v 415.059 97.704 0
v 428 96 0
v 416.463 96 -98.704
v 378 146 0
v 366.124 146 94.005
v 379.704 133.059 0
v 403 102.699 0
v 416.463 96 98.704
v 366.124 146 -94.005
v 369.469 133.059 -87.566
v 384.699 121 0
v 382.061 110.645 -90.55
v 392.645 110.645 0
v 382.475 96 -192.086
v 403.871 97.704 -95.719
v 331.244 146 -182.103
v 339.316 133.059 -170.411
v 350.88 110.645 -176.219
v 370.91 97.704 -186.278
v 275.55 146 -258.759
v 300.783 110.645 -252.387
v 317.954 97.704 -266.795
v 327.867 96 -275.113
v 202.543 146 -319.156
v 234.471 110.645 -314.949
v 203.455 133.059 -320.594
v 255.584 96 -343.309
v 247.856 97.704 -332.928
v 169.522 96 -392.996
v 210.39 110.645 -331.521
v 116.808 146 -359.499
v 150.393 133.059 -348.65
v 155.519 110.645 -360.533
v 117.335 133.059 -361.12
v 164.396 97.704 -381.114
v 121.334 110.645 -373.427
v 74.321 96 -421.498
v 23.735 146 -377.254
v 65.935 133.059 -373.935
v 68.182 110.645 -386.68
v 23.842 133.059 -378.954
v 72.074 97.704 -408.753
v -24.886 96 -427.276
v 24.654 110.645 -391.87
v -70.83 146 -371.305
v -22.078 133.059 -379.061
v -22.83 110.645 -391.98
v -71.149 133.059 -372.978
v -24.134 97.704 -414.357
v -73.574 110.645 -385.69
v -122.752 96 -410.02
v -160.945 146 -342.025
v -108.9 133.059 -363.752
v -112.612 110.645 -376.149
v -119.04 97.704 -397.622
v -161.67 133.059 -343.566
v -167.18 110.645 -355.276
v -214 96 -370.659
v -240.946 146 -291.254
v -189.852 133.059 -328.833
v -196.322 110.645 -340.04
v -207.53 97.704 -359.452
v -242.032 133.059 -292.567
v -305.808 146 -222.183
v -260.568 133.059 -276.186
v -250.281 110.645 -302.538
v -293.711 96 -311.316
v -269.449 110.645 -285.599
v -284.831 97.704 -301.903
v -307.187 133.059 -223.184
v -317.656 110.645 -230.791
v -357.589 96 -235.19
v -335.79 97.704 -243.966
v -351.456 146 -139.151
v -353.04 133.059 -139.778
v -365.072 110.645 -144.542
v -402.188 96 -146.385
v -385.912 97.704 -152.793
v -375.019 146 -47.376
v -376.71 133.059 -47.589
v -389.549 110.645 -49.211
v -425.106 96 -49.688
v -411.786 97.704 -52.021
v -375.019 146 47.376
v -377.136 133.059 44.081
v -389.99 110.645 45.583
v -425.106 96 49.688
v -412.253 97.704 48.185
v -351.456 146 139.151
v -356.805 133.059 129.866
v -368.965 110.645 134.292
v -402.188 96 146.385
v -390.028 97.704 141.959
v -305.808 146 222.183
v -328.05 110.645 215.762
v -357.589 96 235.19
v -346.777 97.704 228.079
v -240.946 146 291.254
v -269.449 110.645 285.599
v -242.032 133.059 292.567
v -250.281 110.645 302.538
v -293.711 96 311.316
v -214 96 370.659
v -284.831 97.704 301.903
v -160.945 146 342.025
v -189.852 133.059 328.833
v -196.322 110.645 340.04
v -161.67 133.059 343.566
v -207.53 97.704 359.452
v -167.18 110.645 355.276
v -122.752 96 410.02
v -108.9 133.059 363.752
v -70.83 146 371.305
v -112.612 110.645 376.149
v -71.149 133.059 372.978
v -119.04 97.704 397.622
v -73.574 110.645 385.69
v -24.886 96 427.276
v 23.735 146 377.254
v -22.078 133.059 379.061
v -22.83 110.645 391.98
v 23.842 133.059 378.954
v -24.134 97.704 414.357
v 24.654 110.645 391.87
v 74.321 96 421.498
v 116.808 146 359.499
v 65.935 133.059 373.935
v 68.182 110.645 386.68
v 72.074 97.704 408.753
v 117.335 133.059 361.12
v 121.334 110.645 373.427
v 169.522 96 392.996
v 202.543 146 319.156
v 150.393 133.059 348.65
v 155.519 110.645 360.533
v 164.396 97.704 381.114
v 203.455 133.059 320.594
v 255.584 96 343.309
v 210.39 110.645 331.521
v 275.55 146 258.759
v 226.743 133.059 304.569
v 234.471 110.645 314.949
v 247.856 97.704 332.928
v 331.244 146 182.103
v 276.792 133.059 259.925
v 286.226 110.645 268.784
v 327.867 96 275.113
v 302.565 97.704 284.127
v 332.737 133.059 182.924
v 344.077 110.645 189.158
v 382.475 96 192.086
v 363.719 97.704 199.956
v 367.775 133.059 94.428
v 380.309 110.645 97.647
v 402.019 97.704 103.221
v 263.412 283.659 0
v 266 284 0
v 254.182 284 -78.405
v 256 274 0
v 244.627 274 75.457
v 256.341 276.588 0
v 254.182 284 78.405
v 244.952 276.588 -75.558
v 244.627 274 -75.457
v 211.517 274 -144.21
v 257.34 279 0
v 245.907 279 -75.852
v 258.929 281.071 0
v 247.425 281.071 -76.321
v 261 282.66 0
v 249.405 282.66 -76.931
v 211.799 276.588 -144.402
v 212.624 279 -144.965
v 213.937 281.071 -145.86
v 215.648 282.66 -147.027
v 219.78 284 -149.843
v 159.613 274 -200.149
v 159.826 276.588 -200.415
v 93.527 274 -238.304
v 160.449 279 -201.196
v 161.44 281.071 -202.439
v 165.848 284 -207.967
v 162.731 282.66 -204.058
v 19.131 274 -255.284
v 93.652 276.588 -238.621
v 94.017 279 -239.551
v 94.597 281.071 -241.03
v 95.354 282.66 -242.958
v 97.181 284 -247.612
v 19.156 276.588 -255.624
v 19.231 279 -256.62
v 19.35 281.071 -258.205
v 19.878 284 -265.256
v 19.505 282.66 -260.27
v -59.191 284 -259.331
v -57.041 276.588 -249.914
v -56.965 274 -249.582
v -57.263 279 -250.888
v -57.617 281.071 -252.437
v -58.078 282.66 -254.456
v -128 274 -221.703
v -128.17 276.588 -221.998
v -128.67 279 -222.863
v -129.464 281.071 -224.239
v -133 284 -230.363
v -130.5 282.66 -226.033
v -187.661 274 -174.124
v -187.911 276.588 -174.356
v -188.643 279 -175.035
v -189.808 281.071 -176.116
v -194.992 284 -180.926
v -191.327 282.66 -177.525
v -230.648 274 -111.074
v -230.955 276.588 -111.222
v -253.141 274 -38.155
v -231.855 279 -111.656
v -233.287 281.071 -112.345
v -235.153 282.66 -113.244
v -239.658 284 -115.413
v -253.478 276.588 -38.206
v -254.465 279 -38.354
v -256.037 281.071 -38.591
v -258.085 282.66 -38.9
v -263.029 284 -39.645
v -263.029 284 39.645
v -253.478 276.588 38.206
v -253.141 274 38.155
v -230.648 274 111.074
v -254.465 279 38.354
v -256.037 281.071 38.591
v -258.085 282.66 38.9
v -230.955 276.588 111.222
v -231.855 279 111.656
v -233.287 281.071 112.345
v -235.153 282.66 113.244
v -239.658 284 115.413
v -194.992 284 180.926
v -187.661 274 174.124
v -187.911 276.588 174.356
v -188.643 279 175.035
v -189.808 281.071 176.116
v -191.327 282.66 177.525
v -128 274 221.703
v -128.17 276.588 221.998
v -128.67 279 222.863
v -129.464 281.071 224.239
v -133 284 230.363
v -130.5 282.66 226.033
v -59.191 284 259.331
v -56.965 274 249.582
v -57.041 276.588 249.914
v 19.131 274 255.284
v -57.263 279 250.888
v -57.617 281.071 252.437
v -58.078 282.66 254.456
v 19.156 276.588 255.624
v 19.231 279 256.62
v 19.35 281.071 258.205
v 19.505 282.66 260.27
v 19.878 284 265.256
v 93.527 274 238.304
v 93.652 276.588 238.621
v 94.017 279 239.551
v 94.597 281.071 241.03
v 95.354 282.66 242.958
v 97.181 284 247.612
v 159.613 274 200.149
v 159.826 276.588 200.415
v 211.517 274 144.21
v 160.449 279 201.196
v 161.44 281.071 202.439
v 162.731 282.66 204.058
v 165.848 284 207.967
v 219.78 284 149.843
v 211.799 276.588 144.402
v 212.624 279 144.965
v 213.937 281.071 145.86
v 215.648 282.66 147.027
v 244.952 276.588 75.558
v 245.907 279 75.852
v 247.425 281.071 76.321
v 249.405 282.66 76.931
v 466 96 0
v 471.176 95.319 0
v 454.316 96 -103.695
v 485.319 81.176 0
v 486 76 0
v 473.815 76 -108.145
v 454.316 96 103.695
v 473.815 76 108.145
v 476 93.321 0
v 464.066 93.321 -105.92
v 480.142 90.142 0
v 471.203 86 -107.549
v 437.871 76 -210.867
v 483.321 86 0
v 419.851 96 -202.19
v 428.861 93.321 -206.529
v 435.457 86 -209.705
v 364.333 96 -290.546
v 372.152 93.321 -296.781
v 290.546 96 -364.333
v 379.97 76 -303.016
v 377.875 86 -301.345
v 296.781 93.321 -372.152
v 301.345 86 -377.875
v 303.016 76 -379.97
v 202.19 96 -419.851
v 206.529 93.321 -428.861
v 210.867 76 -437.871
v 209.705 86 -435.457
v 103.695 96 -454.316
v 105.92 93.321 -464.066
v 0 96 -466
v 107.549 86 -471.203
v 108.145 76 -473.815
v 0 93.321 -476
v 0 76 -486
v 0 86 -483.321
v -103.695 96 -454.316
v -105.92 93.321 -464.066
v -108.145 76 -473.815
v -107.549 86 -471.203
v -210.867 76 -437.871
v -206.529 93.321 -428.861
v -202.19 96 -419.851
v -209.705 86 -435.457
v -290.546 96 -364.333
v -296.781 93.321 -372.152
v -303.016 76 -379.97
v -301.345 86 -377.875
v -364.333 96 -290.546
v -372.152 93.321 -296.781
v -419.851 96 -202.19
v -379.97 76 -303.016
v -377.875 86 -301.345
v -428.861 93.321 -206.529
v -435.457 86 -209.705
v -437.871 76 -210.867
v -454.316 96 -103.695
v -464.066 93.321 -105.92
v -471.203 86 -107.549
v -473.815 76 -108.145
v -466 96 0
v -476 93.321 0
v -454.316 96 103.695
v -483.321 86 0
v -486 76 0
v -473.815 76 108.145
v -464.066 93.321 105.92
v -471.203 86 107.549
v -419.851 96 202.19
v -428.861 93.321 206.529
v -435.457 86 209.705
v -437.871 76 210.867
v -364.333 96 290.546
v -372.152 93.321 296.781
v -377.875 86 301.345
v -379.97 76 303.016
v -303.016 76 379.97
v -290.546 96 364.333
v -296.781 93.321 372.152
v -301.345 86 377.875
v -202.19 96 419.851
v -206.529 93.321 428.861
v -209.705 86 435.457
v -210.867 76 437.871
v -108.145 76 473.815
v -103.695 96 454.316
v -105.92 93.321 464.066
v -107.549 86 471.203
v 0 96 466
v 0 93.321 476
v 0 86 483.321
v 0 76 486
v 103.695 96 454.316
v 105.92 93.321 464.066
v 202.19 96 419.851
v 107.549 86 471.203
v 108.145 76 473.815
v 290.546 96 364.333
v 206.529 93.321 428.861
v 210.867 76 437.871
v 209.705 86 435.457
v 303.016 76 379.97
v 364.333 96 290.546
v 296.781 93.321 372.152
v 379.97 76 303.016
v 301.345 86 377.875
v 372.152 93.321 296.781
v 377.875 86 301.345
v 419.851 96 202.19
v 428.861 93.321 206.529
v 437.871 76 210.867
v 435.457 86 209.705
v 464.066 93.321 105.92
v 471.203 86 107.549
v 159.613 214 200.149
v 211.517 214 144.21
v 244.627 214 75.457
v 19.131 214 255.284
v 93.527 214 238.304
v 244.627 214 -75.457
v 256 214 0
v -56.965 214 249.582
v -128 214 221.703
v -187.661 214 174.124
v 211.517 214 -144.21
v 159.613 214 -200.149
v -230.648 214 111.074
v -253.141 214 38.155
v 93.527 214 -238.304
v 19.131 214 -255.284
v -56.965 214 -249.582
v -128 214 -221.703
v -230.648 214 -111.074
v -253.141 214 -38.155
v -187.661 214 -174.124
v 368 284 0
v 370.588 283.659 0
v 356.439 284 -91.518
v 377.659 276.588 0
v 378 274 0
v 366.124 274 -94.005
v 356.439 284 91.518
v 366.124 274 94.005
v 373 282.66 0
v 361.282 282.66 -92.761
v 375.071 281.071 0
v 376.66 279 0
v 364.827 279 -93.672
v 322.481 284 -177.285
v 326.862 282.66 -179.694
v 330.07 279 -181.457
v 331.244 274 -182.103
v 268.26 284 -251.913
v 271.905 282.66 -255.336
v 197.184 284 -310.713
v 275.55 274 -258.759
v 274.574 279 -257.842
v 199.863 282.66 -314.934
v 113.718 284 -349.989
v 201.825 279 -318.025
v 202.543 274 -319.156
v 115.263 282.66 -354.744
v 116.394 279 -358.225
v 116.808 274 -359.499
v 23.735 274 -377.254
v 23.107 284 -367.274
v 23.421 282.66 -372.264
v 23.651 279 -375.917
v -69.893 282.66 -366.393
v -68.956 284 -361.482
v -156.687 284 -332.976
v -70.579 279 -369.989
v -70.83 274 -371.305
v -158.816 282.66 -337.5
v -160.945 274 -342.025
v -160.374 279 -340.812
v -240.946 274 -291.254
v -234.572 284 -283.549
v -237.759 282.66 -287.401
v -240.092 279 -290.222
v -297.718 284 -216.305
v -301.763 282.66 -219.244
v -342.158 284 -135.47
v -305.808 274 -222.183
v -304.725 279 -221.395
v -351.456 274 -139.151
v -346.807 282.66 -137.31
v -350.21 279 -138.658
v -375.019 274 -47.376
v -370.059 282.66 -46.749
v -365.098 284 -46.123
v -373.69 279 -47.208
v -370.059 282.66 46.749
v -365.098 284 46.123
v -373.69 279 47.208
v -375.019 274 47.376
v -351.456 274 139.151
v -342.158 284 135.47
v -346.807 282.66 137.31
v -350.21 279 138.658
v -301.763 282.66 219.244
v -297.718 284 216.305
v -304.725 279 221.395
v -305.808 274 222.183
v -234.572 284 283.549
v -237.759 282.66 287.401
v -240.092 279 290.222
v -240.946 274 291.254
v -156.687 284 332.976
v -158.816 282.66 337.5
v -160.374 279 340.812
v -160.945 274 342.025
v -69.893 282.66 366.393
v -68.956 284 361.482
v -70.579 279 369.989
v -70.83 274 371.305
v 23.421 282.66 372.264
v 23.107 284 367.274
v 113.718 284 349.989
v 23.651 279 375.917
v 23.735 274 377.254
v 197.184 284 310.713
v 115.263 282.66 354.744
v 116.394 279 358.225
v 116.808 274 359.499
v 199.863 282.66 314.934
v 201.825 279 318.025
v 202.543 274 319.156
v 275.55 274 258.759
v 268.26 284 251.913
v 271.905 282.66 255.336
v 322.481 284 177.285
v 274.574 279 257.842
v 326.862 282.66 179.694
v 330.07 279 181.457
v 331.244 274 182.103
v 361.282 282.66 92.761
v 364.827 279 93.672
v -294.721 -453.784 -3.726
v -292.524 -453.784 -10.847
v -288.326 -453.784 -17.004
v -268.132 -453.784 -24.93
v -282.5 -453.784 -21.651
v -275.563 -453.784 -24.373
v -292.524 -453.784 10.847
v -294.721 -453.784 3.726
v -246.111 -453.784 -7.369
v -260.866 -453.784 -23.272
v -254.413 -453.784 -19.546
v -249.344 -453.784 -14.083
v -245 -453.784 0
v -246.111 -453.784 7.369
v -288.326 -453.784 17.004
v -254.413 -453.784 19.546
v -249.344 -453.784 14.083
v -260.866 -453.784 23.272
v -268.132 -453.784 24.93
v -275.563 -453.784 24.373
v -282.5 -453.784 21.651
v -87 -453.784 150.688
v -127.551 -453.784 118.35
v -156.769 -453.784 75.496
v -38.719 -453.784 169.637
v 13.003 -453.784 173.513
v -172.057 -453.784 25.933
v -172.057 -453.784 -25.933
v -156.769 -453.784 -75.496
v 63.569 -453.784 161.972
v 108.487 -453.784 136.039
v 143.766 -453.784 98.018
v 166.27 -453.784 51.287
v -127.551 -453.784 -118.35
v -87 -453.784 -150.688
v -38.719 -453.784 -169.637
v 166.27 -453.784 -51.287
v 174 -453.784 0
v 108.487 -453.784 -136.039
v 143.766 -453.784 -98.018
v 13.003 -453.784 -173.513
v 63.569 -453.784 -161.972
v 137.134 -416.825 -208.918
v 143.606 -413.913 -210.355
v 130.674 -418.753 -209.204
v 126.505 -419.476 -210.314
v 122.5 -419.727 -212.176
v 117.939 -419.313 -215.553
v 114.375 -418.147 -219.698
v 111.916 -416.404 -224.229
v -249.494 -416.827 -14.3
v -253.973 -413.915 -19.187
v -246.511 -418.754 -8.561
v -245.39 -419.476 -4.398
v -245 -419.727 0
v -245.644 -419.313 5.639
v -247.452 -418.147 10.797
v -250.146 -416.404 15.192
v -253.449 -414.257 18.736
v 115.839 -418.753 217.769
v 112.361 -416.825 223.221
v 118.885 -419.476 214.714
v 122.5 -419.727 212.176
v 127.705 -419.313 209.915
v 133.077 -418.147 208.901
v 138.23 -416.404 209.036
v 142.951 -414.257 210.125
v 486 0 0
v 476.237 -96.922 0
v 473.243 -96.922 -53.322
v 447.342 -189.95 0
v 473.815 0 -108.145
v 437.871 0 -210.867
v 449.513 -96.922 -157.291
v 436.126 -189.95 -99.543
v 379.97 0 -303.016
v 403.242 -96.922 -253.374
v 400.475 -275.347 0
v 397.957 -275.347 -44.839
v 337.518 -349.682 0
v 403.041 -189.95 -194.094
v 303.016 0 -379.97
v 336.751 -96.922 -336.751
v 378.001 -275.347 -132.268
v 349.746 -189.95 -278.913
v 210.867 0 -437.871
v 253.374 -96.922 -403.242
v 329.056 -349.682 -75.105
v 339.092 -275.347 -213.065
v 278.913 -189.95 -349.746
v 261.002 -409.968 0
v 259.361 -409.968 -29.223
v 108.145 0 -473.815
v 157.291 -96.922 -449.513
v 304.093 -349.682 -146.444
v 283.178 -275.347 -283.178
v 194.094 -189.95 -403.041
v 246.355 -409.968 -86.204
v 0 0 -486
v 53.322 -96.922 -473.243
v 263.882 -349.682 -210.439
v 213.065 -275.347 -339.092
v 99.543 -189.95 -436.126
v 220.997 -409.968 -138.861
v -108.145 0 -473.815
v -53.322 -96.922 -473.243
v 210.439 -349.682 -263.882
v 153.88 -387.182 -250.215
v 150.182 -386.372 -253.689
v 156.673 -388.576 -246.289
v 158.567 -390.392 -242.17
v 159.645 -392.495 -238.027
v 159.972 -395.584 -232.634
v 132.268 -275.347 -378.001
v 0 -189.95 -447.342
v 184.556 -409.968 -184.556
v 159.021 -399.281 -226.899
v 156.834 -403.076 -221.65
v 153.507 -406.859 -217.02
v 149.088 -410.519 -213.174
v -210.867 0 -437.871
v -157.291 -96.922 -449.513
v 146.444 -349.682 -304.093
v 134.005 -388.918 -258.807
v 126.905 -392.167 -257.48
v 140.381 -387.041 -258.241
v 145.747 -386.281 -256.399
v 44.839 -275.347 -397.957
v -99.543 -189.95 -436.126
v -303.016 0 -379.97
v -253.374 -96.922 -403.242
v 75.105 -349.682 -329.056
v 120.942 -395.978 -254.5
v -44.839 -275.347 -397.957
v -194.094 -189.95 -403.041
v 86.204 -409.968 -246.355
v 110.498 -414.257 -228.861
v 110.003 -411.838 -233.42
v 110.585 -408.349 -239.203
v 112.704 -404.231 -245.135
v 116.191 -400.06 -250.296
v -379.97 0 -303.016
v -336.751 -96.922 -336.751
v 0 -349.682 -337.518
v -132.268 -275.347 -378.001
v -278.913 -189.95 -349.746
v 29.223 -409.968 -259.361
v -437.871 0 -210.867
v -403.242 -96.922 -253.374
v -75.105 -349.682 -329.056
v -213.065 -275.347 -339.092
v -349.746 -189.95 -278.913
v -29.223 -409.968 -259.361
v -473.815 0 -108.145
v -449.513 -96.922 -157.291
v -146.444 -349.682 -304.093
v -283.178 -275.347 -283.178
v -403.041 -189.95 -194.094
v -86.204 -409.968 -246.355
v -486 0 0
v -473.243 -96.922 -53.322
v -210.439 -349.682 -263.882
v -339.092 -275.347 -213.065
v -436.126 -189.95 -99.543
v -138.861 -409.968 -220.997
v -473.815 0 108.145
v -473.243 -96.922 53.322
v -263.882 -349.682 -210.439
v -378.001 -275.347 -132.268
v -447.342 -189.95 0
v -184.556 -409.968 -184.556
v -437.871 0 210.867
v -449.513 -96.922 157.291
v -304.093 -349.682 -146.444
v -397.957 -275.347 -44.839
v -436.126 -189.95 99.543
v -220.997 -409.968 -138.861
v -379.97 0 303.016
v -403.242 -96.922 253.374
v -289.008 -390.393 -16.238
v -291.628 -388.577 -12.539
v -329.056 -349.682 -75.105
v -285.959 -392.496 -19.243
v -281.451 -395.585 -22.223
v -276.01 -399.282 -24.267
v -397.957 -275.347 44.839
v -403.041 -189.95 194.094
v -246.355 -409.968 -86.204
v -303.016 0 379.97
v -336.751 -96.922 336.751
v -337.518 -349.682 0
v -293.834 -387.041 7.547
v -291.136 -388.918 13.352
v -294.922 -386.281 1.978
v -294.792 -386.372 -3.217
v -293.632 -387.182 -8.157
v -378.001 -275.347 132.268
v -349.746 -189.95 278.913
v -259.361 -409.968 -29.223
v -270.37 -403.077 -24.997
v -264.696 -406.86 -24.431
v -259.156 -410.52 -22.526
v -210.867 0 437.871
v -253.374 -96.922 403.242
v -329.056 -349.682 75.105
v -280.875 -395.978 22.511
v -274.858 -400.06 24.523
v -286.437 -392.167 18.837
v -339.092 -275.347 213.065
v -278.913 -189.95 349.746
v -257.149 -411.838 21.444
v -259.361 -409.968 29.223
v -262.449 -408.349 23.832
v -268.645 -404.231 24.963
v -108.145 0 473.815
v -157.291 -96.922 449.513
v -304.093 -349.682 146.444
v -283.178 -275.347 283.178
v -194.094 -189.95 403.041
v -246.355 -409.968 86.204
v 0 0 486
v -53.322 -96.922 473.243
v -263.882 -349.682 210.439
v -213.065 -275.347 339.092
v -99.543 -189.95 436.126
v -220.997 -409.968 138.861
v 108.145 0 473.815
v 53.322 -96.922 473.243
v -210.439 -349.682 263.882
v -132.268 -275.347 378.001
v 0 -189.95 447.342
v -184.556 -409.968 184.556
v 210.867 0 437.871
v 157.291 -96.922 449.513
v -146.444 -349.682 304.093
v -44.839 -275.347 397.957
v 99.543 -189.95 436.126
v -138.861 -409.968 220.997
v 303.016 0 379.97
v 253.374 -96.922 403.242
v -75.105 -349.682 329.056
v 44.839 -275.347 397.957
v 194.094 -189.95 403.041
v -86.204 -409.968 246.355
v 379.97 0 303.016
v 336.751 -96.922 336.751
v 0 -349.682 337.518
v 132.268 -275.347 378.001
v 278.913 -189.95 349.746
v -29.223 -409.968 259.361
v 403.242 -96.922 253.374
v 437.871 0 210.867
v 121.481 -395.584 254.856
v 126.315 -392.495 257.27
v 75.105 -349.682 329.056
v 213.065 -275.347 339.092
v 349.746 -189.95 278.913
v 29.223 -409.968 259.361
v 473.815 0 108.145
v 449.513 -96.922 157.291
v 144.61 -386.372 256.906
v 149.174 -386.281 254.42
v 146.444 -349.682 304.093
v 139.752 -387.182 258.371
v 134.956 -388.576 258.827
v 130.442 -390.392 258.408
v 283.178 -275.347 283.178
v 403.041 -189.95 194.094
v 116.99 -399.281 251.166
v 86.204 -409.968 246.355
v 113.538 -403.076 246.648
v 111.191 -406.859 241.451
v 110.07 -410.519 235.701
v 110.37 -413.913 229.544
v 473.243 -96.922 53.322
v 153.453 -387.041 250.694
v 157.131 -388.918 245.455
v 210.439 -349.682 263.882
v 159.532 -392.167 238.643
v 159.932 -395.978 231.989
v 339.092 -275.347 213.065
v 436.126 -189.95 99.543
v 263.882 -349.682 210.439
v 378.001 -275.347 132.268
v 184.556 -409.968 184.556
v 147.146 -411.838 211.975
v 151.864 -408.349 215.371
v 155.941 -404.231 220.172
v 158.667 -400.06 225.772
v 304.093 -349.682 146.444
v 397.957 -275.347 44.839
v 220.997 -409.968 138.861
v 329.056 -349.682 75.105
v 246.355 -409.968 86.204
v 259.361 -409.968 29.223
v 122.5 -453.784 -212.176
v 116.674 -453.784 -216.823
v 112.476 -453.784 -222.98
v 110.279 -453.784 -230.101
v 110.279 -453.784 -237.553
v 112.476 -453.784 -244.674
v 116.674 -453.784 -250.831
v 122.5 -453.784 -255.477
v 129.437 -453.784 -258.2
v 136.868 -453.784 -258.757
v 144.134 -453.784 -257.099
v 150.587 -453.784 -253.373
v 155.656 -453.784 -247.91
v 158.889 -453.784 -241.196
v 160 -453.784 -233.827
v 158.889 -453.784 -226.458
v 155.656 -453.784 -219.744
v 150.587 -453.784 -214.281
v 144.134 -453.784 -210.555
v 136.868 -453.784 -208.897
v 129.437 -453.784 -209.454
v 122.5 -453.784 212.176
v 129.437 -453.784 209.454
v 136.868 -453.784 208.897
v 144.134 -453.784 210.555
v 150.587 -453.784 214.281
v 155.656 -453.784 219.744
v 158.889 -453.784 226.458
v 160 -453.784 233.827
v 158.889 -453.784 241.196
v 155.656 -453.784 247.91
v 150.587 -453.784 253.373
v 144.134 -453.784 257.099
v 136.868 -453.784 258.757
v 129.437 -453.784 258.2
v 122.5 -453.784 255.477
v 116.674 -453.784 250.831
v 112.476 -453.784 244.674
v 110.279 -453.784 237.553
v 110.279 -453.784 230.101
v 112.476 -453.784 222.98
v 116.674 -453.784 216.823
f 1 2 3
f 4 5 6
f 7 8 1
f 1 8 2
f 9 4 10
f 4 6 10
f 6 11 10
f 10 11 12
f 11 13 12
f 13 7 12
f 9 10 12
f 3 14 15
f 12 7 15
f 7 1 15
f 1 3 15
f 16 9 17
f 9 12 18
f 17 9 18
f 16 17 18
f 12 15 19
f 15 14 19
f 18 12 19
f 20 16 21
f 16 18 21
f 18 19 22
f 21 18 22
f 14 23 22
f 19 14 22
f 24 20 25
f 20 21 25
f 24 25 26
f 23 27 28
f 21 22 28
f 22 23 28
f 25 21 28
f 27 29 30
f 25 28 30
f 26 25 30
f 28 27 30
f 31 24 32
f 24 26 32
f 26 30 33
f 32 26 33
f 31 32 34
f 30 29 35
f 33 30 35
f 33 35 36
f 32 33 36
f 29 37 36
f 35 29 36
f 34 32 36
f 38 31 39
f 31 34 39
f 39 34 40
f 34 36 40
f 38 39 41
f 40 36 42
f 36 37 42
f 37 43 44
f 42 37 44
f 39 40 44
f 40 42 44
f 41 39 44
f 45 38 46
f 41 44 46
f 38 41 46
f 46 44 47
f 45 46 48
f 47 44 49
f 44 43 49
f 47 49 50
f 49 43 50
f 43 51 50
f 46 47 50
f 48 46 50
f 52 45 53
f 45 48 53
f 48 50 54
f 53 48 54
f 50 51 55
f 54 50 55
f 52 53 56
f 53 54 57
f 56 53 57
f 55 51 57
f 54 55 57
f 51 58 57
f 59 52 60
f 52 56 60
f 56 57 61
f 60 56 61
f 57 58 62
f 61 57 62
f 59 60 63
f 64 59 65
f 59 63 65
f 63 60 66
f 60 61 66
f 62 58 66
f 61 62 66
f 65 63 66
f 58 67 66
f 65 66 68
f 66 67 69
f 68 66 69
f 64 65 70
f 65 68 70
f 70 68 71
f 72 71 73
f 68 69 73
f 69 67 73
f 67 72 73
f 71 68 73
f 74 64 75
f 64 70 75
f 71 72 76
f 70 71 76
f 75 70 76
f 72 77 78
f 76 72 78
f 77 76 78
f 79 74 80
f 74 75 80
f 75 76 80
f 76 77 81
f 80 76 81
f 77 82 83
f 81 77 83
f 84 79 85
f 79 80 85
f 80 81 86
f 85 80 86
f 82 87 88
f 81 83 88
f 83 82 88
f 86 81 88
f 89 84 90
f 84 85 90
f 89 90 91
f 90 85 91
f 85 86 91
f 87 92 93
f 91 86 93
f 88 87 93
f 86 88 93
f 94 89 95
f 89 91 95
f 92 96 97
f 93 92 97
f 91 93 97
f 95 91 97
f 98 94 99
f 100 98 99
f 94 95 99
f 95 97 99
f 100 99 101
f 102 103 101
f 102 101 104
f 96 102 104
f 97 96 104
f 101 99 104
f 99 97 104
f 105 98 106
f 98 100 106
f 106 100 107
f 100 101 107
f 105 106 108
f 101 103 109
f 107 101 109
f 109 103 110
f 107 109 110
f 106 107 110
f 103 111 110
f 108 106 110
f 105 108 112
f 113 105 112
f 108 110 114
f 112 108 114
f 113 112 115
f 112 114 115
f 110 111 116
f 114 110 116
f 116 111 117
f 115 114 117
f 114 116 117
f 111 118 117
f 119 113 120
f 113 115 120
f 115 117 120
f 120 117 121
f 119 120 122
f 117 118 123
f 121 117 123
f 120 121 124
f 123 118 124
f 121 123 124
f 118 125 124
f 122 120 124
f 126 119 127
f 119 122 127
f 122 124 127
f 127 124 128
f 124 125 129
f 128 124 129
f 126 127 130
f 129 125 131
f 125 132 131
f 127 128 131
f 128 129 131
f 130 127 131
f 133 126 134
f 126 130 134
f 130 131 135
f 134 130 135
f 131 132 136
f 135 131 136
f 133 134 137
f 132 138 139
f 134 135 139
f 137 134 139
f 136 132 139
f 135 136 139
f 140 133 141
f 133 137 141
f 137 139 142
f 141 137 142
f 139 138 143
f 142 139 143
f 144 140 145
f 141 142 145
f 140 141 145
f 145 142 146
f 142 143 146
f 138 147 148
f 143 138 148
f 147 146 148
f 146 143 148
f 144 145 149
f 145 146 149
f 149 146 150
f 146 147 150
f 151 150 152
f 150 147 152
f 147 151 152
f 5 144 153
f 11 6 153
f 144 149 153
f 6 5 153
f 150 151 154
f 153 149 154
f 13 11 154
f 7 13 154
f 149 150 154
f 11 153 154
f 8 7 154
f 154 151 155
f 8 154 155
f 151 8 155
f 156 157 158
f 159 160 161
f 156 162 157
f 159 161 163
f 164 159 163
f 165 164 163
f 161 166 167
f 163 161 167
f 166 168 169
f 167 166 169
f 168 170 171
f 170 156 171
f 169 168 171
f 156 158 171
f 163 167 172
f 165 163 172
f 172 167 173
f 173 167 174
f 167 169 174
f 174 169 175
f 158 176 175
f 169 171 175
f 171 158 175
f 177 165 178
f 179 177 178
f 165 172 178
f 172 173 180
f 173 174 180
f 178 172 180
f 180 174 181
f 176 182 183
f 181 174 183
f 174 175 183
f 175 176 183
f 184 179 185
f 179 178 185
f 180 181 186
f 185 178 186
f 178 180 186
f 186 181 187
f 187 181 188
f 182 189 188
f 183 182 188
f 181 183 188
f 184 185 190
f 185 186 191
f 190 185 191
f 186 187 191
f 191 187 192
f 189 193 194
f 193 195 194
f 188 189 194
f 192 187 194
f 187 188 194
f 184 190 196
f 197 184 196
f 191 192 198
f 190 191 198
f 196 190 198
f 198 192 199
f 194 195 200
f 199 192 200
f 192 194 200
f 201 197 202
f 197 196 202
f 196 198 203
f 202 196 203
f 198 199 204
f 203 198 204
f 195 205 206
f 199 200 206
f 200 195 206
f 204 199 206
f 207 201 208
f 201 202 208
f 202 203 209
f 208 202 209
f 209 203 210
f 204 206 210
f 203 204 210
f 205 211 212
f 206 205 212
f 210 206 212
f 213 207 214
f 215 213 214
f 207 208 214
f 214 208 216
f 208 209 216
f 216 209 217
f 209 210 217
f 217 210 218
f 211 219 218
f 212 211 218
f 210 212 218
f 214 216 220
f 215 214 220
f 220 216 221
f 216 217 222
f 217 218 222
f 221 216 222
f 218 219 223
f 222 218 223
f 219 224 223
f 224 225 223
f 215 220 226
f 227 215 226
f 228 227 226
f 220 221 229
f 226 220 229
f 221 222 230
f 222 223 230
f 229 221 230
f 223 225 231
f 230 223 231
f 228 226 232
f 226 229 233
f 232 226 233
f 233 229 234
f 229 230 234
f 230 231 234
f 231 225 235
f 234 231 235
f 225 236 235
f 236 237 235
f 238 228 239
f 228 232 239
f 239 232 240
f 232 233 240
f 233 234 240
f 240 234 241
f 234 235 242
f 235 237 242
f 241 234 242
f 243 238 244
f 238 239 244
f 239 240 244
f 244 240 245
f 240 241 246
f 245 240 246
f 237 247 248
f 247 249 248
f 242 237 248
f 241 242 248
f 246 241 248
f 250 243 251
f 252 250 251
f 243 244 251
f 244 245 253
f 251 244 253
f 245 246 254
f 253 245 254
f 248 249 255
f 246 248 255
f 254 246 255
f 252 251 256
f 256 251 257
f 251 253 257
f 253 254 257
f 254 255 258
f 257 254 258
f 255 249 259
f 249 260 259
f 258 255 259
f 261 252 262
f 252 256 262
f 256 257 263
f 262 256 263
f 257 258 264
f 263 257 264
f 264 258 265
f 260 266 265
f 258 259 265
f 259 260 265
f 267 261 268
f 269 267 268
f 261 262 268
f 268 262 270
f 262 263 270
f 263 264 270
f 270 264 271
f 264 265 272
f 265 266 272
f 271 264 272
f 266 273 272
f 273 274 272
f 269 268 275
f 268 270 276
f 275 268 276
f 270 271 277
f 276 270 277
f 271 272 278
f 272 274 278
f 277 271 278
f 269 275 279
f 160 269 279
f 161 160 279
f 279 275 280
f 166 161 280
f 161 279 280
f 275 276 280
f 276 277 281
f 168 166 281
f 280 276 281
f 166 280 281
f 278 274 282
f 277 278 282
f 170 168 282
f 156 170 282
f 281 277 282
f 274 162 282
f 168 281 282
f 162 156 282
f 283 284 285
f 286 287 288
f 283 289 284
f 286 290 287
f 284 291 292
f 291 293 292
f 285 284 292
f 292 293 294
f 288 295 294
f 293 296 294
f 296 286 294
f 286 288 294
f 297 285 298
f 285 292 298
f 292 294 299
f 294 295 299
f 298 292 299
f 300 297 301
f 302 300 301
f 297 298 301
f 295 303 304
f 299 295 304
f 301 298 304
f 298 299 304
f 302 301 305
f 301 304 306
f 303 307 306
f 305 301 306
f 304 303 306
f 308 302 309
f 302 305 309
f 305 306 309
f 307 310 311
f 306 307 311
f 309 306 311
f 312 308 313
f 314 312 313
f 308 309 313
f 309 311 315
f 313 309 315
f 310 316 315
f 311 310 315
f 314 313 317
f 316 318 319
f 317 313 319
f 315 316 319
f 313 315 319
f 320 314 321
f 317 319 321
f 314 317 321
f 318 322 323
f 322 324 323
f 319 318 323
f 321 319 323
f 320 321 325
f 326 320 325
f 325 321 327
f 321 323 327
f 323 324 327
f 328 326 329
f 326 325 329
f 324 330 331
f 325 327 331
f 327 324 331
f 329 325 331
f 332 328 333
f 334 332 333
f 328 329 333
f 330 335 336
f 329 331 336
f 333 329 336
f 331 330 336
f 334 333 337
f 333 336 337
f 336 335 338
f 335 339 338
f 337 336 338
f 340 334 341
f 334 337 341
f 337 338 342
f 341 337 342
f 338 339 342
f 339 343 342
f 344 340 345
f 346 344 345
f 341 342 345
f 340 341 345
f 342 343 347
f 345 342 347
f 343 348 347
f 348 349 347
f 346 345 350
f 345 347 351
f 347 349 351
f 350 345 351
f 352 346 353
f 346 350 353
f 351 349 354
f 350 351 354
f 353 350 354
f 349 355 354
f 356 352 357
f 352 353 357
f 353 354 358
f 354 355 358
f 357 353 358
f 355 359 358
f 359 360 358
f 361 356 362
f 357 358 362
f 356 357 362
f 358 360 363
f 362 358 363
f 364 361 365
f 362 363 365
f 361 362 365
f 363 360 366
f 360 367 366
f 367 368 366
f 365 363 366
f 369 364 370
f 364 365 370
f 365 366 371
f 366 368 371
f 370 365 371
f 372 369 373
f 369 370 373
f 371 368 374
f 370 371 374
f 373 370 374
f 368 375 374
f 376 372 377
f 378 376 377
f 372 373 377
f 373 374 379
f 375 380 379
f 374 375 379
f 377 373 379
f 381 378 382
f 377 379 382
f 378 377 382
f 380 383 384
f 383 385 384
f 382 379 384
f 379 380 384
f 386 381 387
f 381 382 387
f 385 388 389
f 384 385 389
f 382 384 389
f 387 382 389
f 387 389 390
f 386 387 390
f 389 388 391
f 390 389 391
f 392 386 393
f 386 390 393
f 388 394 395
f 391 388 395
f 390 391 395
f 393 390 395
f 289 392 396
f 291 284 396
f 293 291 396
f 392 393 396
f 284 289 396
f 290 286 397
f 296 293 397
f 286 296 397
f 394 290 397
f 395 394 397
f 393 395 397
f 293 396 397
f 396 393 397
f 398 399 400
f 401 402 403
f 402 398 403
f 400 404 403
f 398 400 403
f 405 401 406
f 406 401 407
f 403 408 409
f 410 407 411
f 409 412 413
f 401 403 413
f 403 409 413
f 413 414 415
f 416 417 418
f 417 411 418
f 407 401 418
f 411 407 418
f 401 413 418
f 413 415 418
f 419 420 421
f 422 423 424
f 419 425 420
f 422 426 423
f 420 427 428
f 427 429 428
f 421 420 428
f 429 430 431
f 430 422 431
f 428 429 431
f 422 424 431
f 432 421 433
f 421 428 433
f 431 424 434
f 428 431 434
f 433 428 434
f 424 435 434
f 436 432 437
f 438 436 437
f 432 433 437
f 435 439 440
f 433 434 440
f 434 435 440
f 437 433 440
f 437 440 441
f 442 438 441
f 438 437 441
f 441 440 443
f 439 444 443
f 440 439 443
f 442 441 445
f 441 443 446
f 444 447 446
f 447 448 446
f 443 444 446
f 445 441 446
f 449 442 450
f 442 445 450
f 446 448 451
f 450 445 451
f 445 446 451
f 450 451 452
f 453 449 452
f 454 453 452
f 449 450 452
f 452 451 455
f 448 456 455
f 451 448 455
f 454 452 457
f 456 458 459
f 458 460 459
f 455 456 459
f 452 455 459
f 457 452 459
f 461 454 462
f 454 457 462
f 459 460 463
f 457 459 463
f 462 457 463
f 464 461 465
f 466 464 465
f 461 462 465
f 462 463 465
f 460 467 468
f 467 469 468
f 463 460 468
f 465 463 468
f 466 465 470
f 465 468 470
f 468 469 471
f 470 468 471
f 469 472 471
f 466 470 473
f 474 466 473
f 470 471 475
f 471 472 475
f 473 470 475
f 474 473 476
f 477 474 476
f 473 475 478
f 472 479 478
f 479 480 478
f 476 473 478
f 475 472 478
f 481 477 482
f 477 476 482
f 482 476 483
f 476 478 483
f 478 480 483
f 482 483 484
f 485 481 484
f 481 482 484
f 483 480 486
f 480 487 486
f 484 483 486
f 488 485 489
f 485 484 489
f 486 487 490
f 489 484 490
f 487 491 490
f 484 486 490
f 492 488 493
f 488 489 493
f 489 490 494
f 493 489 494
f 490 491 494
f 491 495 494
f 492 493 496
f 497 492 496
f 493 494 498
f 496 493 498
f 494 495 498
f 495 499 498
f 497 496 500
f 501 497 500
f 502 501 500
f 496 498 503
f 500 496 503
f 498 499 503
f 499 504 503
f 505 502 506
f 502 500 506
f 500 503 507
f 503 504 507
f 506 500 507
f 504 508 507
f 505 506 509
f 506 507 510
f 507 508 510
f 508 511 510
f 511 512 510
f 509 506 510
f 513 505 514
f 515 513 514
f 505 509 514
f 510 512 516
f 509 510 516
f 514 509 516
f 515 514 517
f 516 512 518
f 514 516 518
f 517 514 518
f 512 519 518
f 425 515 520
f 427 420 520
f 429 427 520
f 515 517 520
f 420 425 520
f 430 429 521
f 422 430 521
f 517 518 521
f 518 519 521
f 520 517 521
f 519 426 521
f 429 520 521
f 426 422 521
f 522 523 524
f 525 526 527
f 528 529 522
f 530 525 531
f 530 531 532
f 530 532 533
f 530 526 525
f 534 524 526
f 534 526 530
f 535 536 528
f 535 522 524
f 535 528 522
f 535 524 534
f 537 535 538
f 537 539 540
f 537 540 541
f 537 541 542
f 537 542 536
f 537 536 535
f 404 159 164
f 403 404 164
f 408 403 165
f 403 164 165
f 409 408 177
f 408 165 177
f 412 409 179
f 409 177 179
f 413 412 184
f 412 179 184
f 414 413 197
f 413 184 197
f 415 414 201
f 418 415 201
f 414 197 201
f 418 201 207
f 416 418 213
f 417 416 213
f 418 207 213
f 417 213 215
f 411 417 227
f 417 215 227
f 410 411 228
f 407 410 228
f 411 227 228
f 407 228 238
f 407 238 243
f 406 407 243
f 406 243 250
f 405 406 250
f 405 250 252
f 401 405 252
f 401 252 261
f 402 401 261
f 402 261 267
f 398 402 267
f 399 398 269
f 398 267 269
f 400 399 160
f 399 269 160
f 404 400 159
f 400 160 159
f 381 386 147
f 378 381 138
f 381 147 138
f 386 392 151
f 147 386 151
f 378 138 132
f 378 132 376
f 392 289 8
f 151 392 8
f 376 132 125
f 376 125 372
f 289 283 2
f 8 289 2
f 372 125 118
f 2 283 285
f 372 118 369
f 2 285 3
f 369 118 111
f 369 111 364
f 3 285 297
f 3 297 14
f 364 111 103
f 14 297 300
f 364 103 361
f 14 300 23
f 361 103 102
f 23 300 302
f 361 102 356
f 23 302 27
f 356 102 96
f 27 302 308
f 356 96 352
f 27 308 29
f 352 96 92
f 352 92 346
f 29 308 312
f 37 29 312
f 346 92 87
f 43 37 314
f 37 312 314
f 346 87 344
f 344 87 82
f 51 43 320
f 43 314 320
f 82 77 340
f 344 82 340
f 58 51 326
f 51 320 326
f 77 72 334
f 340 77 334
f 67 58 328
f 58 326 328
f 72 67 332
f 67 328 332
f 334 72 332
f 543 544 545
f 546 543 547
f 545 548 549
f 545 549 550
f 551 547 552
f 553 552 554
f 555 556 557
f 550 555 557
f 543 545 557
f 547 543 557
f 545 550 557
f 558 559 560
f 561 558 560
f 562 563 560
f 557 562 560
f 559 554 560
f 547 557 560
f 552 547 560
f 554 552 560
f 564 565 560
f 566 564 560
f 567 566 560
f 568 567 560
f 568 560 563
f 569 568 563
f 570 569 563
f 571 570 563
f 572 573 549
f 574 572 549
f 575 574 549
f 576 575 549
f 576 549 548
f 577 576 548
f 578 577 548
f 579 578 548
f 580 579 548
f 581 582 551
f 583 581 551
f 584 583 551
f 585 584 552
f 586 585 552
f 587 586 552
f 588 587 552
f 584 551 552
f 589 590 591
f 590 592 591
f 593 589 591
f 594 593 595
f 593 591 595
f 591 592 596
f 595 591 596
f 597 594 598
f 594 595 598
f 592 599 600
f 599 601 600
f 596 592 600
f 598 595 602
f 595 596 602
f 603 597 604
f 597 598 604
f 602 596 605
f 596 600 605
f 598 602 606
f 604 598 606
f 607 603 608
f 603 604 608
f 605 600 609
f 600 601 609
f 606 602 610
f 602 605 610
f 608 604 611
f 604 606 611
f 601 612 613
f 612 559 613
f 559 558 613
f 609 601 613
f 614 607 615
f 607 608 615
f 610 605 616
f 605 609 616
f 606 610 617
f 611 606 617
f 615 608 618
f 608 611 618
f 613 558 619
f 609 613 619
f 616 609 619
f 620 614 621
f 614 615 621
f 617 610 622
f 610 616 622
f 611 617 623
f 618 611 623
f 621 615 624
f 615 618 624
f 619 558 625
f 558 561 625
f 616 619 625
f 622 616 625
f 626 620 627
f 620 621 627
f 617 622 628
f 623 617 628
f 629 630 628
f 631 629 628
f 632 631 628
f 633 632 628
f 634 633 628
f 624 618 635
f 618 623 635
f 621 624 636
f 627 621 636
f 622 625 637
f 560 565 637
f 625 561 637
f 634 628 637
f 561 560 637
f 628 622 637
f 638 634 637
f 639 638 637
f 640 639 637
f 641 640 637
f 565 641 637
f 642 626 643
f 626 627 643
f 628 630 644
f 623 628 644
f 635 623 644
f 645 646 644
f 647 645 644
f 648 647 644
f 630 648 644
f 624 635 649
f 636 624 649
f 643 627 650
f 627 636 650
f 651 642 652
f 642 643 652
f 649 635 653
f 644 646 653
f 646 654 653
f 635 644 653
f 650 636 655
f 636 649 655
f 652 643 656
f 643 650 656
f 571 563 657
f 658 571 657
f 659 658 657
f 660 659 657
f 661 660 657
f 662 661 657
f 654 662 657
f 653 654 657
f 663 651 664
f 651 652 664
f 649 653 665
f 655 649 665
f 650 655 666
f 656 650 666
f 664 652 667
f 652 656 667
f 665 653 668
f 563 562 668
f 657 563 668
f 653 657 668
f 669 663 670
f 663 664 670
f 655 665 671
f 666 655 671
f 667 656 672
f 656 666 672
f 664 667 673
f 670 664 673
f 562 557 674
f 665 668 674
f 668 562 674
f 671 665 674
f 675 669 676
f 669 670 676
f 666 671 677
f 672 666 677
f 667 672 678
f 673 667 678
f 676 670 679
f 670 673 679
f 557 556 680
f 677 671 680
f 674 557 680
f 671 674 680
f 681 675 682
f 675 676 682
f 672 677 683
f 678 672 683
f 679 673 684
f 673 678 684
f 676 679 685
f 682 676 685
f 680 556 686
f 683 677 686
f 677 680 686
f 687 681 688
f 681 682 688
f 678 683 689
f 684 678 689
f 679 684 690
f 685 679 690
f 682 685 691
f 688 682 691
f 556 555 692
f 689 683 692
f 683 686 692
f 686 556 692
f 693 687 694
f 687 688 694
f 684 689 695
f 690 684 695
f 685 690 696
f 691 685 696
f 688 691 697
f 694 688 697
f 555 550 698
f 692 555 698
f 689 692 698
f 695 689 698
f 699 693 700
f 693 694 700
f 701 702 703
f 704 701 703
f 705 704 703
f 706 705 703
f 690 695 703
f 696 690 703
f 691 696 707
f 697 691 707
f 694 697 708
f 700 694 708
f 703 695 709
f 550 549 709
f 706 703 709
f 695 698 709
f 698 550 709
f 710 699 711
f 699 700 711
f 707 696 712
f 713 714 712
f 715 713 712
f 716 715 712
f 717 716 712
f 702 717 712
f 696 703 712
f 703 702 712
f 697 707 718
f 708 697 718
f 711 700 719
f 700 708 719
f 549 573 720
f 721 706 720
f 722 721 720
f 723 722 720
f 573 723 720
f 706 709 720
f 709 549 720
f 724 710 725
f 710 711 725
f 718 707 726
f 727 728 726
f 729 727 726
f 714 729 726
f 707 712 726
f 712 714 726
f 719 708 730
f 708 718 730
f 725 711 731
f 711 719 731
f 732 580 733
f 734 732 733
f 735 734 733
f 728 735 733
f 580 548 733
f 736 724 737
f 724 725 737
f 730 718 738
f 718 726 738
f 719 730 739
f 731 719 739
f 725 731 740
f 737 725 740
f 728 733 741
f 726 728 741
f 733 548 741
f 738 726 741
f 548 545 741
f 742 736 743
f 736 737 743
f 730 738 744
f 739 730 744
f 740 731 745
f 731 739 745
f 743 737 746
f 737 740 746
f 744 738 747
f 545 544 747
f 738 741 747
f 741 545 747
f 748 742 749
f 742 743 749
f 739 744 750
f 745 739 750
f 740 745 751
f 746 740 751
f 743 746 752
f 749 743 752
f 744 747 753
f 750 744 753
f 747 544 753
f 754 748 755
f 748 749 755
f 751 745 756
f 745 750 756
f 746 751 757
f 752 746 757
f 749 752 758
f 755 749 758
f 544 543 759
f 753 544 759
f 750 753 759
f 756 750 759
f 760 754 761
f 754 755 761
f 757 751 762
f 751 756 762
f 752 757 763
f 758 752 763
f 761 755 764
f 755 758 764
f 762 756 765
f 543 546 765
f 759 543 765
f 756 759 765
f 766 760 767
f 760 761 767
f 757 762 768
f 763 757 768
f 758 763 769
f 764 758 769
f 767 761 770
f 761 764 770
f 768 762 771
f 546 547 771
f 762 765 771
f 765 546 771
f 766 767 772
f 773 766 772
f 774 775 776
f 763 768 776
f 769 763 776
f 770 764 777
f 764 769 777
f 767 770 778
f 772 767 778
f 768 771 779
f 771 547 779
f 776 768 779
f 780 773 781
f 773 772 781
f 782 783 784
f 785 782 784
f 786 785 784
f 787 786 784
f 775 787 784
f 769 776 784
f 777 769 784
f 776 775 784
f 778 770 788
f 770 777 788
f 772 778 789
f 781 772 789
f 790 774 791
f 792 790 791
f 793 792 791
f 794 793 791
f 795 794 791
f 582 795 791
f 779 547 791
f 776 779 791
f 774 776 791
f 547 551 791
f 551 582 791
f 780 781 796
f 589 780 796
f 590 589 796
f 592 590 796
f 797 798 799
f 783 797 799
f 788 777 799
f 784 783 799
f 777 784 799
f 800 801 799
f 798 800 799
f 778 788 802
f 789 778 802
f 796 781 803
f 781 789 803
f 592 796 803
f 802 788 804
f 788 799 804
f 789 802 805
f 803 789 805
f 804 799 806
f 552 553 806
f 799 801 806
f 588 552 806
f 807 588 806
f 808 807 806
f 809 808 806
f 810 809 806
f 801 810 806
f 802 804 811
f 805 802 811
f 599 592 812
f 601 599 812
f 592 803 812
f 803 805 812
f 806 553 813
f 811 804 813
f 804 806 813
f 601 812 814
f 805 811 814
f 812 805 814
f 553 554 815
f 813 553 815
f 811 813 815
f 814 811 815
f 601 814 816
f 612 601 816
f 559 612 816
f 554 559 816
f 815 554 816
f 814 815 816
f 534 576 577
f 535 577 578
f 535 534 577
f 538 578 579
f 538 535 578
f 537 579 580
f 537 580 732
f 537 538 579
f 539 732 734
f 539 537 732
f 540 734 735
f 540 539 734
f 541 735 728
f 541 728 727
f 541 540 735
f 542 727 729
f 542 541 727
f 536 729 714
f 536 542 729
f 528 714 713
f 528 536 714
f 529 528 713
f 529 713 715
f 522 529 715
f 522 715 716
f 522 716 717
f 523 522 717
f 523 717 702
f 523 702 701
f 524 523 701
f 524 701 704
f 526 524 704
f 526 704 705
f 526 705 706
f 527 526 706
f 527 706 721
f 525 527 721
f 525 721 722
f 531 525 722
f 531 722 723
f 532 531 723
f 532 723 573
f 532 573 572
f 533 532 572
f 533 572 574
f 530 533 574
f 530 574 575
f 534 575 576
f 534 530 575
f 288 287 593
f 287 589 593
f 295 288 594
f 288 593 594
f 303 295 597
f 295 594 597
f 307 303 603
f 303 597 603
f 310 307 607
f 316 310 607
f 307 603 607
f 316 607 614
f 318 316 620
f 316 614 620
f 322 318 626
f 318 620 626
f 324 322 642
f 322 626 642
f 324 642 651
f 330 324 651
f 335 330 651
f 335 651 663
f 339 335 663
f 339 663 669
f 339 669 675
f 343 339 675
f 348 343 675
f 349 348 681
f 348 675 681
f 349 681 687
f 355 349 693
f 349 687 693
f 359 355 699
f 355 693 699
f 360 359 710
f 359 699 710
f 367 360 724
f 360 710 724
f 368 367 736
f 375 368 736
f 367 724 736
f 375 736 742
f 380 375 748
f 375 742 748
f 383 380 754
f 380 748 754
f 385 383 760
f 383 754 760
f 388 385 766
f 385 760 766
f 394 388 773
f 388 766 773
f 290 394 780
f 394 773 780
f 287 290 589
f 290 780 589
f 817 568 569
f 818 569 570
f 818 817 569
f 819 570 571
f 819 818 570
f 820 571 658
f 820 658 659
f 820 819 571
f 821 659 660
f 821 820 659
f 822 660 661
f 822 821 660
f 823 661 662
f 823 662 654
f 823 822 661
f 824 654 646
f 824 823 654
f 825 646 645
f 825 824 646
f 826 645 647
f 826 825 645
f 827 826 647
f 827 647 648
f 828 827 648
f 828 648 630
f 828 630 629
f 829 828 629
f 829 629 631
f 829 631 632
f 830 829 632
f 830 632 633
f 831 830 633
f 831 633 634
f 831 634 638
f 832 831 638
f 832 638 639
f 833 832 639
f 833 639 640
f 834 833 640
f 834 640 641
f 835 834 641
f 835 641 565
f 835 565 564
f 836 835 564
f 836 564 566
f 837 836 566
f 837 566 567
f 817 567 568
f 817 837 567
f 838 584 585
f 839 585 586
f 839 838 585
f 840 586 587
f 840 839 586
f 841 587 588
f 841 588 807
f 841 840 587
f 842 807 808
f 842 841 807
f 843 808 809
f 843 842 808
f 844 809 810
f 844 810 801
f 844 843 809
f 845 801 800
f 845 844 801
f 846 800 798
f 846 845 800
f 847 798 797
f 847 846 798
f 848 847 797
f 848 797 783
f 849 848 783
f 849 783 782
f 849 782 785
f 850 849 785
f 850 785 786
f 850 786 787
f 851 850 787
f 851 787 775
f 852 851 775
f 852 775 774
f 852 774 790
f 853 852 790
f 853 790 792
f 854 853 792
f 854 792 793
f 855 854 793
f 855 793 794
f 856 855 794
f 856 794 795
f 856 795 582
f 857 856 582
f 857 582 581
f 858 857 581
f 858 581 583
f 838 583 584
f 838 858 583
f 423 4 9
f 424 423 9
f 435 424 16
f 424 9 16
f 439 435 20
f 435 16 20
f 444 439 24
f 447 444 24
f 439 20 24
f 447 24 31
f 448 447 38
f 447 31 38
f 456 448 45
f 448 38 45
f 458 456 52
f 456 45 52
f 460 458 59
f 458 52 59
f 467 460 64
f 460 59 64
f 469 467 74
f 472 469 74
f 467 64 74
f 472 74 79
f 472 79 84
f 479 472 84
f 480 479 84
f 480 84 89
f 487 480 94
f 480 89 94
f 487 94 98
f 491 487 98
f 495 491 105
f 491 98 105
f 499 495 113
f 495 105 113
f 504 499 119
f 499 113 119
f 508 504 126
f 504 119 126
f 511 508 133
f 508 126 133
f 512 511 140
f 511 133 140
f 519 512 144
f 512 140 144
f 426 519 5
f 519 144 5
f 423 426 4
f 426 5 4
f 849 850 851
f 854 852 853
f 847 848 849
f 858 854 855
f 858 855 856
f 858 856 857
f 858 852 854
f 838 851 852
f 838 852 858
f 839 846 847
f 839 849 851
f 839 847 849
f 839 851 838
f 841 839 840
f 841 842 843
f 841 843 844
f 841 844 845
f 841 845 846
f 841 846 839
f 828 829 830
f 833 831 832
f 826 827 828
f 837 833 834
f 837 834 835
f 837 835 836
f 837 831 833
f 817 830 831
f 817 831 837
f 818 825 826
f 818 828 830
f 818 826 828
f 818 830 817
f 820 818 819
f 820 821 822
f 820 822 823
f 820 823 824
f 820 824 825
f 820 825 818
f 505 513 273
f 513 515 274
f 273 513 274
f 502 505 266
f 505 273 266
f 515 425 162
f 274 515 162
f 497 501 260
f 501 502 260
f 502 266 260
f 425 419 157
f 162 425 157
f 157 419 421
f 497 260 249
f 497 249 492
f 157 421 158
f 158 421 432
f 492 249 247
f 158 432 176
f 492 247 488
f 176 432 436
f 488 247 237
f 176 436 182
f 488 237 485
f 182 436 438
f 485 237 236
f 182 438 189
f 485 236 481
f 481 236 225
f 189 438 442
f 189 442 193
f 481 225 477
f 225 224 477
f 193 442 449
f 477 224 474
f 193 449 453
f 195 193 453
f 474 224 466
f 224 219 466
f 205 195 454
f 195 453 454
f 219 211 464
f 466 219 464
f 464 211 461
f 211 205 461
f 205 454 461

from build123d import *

# Parameters (mm, degrees)
FILLET1_R           = 10
SKETCH2_R           = 25
BOSS_EXTRUDE1_DEPTH = 80
CIRPATTERN1_COUNT   = 3


with BuildPart() as part:
    # Sketch1 → Revolve1 (revolve)
    with BuildSketch(Plane.XY):
        with BuildLine():
            Line((0, 214), (256, 214))
            Line((256, 214), (256, 284))
            Line((256, 284), (378, 284))
            Line((378, 284), (378, 146))
            ThreePointArc((378, 146), (392.644660941, 110.644660941), (428, 96))
            Line((428, 96), (466, 96))
            ThreePointArc((466, 96), (480.142135624, 90.142135624), (486, 76))
            Line((486, 76), (486, 0))
            ThreePointArc((486, 0), (400.474718303, -275.347053734), (174, -453.784089629))
            Line((174, -453.784089629), (0, -453.784089629))
            Line((0, -453.784089629), (0, 214))
        make_face()
    revolve(axis=Axis((0, -1000, 0), (0, 1, 0)))

    # Fillet1
    fillet1_edges = [part.edges().sort_by_distance(p)[0] for p in [
        (-256, 284, 0),
        (-378, 284, 0),
    ]]
    fillet(fillet1_edges, radius=FILLET1_R)

    # Sketch2 → Boss-Extrude1 (add)
    with BuildSketch(Plane.XZ.offset(453.784089629)):
        with Locations((-270, 0)):
            Circle(SKETCH2_R)
    boss_extrude1 = extrude(amount=-BOSS_EXTRUDE1_DEPTH)

    # CirPattern1: Boss-Extrude1 ×3 about axis
    cirpattern1_axis = Axis((0, 0, 0), (0, 1, 0))
    for i in range(1, CIRPATTERN1_COUNT):
        add(boss_extrude1.rotate(cirpattern1_axis, i * 360 / CIRPATTERN1_COUNT))


solid = part.part
